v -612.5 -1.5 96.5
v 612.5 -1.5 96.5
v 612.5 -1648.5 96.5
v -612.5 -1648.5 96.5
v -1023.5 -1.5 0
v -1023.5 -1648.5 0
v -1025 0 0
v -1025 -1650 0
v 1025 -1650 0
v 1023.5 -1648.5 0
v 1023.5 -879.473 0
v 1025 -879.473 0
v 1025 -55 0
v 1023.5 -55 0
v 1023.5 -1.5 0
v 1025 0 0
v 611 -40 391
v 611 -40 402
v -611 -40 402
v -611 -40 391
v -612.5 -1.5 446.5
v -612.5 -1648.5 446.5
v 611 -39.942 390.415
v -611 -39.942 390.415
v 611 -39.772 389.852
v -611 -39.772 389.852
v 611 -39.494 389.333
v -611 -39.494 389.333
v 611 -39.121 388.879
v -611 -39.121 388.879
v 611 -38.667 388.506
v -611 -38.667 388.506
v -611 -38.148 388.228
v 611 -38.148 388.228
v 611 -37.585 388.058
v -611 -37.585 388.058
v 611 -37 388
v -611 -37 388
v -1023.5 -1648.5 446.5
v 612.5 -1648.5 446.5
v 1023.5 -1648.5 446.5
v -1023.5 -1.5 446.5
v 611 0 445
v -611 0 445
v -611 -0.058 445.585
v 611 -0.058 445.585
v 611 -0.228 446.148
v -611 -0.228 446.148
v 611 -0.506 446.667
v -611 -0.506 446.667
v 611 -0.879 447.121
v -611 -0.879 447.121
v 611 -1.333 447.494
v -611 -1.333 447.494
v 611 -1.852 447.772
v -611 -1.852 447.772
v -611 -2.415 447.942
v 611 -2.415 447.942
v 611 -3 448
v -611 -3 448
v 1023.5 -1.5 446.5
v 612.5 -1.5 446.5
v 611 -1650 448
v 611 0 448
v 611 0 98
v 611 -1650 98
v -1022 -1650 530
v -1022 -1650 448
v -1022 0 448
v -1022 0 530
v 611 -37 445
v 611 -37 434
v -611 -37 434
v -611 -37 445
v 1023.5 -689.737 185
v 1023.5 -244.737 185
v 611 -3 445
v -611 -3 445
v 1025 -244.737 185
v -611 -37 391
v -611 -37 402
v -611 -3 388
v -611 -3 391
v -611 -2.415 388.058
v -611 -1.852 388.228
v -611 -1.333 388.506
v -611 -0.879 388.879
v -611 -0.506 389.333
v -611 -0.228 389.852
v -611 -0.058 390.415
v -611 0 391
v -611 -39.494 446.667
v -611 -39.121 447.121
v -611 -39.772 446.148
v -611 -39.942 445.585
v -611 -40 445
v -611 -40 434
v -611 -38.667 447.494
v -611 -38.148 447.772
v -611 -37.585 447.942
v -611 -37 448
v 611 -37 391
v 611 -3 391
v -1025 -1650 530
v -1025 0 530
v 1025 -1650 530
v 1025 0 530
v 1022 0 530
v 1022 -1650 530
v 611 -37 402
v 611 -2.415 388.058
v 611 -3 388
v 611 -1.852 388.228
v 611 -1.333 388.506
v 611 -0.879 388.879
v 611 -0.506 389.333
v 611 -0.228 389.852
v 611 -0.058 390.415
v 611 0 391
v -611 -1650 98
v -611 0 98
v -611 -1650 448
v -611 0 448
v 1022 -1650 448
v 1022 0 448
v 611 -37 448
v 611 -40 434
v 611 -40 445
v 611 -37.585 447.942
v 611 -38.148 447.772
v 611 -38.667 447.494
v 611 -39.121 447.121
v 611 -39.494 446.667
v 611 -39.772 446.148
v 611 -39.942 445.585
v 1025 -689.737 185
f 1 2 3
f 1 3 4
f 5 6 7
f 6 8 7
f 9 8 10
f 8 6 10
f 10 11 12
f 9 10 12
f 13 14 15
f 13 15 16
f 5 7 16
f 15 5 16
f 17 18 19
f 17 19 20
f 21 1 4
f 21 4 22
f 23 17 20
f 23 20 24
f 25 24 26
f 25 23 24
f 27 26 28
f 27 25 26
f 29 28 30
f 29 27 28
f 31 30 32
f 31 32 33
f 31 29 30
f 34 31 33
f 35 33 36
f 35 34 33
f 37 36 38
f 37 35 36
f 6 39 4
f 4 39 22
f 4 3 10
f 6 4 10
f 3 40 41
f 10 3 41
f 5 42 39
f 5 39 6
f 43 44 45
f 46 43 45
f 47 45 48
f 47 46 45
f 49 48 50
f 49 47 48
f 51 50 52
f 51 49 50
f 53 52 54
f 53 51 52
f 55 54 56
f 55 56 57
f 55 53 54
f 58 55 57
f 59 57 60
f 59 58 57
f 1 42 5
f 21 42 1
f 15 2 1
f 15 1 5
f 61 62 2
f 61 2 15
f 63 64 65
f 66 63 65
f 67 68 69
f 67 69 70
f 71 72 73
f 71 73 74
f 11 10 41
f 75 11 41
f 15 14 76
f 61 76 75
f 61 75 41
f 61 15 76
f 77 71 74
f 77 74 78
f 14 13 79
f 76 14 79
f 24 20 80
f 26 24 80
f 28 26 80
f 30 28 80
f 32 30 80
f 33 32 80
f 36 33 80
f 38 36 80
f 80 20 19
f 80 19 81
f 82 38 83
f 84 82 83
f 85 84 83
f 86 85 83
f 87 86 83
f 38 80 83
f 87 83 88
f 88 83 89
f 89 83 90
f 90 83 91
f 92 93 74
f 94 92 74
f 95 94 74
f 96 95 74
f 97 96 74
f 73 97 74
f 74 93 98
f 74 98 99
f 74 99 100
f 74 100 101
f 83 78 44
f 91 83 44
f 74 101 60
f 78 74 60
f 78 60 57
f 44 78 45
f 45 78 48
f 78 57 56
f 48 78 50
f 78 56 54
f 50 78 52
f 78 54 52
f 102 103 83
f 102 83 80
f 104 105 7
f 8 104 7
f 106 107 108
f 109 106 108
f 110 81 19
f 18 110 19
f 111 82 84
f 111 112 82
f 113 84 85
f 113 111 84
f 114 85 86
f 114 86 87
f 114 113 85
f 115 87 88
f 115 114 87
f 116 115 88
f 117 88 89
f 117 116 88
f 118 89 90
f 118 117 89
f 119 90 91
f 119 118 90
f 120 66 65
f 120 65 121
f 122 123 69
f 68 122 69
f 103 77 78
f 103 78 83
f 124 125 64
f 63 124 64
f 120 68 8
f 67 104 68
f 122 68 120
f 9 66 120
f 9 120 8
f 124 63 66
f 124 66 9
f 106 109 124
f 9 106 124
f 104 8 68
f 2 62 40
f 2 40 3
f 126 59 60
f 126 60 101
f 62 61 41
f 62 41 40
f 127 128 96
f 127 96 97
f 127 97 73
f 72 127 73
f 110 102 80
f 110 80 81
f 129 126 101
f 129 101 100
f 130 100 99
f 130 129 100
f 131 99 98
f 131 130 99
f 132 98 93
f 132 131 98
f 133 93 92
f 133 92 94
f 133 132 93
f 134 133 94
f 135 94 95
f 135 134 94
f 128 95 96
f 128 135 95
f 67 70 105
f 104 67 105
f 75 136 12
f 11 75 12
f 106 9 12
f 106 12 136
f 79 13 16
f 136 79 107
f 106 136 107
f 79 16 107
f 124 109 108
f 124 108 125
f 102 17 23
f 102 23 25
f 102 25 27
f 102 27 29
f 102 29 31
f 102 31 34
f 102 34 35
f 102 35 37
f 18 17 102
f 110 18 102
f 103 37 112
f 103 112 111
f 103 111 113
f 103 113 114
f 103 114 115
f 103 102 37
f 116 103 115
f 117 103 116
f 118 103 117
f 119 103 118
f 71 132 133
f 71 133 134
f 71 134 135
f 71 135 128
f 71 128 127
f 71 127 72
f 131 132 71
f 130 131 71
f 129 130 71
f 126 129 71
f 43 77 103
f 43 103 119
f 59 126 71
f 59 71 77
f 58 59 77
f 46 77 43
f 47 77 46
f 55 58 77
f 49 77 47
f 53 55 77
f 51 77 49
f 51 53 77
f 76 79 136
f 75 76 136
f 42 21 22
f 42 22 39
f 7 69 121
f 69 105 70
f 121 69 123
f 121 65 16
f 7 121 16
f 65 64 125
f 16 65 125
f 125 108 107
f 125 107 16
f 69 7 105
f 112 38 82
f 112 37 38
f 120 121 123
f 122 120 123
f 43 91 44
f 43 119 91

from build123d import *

# Parameters (mm, degrees)
F1_DEPTH      = 1650
F2_T          = 1.5
F2_T3_DEPTH   = 1653
F4_DEPTH      = 611
F4_DEPTH_BACK = 611
F8_DEPTH      = 1.5


# Not quite as in the source:
# - a shell that OpenCascade refuses in one call is made with other operations: the cavity is built on its own and cut out
# - the program builds the solid bodies; features that only make, move or delete a surface that nothing else refers to are left out


with BuildPart() as f1:
    # F0 (on Front) → F1 (new body)
    with BuildSketch(Plane.XZ):
        Polygon((-1025, 0), (1025, 0), (1025, 530), (1022, 530), (1022, 448), (611, 448), (611, 98), (-611, 98), (-611, 448), (-1022, 448), (-1022, 530), (-1025, 530), align=None)
    extrude(amount=F1_DEPTH)

    # F2: shell of thickness 1.5, made by hand


with BuildPart() as f2_core1:
    # F2_t2: copy of F1
    add(f1.part)

    # the walls: a layer under each face that stays
    f2_faces = [f2_core1.faces().sort_by_distance(p)[0] for p in [
        (1025, -825, 265),
        (1023.5, -825, 530),
        (1022, -825, 489),
        (816.5, -825, 448),
        (611, -825, 273),
        (0, -825, 98),
        (-611, -825, 273),
        (-816.5, -825, 448),
        (-1022, -825, 489),
        (-1023.5, -825, 530),
        (-1025, -825, 265),
        (-683.3333333333, 0, 88.3333333333),
        (-683.3333333333, -1650, 88.3333333333),
    ]]
    thicken(f2_faces, amount=-F2_T, mode=Mode.SUBTRACT)

    # F2_s4 → F2_t3 (cut)
    with BuildSketch(Plane.XZ.offset(-1.5)):
        Polygon((1021.985, 448.015), (1023.5, 448), (1023.5, 446.5), (1022, 446.5), align=None)
        Polygon((610.985, 98.015), (612.5, 98), (612.5, 96.5), (611, 96.5), align=None)
        Polygon((-610.985, 98.015), (-611, 96.5), (-612.5, 96.5), (-612.5, 98), align=None)
        Polygon((-1021.985, 448.015), (-1022, 446.5), (-1023.5, 446.5), (-1023.5, 448), align=None)
    extrude(amount=F2_T3_DEPTH, mode=Mode.SUBTRACT)


with BuildPart() as f1_1:
    add(f1.part)

    # what is left inside the walls is the cavity
    f2_cavity = [f2_core1.part.solids().sort_by_distance(p)[0] for p in [
        (0, -1099.5, 0.015),
    ]]
    add(f2_cavity, mode=Mode.SUBTRACT)

    # F7 (on face) → F8 (cut, through all)
    with BuildSketch(Plane.YZ.offset(1025)):
        Polygon((-879.4733192202, 0), (-55, 0), (-244.7366596101, 185), (-689.7366596101, 185), align=None)
    extrude(amount=-F8_DEPTH, mode=Mode.SUBTRACT)


with BuildPart() as f4:
    # F3 (on Right) → F4 (new body, two sides)
    with BuildSketch(Plane.YZ) as f4_sk:
        with BuildLine():
            Line((0, 391), (0, 445))
            ThreePointArc((0, 445), (-0.8786796564, 447.1213203436), (-3, 448))
            Line((-3, 448), (-37, 448))
            ThreePointArc((-37, 448), (-39.1213203436, 447.1213203436), (-40, 445))
            Line((-40, 445), (-40, 434))
            Line((-40, 434), (-37, 434))
            Line((-37, 434), (-37, 445))
            Line((-37, 445), (-3, 445))
            Line((-3, 445), (-3, 391))
            Line((-3, 391), (-37, 391))
            Line((-37, 391), (-37, 402))
            Line((-37, 402), (-40, 402))
            Line((-40, 402), (-40, 391))
            ThreePointArc((-40, 391), (-39.1213203436, 388.8786796564), (-37, 388))
            Line((-37, 388), (-3, 388))
            ThreePointArc((-3, 388), (-0.8786796564, 388.8786796564), (0, 391))
        make_face()
    extrude(amount=F4_DEPTH)
    extrude(f4_sk.sketch, amount=-F4_DEPTH_BACK)


solid = Compound([f1_1.part, f4.part])
